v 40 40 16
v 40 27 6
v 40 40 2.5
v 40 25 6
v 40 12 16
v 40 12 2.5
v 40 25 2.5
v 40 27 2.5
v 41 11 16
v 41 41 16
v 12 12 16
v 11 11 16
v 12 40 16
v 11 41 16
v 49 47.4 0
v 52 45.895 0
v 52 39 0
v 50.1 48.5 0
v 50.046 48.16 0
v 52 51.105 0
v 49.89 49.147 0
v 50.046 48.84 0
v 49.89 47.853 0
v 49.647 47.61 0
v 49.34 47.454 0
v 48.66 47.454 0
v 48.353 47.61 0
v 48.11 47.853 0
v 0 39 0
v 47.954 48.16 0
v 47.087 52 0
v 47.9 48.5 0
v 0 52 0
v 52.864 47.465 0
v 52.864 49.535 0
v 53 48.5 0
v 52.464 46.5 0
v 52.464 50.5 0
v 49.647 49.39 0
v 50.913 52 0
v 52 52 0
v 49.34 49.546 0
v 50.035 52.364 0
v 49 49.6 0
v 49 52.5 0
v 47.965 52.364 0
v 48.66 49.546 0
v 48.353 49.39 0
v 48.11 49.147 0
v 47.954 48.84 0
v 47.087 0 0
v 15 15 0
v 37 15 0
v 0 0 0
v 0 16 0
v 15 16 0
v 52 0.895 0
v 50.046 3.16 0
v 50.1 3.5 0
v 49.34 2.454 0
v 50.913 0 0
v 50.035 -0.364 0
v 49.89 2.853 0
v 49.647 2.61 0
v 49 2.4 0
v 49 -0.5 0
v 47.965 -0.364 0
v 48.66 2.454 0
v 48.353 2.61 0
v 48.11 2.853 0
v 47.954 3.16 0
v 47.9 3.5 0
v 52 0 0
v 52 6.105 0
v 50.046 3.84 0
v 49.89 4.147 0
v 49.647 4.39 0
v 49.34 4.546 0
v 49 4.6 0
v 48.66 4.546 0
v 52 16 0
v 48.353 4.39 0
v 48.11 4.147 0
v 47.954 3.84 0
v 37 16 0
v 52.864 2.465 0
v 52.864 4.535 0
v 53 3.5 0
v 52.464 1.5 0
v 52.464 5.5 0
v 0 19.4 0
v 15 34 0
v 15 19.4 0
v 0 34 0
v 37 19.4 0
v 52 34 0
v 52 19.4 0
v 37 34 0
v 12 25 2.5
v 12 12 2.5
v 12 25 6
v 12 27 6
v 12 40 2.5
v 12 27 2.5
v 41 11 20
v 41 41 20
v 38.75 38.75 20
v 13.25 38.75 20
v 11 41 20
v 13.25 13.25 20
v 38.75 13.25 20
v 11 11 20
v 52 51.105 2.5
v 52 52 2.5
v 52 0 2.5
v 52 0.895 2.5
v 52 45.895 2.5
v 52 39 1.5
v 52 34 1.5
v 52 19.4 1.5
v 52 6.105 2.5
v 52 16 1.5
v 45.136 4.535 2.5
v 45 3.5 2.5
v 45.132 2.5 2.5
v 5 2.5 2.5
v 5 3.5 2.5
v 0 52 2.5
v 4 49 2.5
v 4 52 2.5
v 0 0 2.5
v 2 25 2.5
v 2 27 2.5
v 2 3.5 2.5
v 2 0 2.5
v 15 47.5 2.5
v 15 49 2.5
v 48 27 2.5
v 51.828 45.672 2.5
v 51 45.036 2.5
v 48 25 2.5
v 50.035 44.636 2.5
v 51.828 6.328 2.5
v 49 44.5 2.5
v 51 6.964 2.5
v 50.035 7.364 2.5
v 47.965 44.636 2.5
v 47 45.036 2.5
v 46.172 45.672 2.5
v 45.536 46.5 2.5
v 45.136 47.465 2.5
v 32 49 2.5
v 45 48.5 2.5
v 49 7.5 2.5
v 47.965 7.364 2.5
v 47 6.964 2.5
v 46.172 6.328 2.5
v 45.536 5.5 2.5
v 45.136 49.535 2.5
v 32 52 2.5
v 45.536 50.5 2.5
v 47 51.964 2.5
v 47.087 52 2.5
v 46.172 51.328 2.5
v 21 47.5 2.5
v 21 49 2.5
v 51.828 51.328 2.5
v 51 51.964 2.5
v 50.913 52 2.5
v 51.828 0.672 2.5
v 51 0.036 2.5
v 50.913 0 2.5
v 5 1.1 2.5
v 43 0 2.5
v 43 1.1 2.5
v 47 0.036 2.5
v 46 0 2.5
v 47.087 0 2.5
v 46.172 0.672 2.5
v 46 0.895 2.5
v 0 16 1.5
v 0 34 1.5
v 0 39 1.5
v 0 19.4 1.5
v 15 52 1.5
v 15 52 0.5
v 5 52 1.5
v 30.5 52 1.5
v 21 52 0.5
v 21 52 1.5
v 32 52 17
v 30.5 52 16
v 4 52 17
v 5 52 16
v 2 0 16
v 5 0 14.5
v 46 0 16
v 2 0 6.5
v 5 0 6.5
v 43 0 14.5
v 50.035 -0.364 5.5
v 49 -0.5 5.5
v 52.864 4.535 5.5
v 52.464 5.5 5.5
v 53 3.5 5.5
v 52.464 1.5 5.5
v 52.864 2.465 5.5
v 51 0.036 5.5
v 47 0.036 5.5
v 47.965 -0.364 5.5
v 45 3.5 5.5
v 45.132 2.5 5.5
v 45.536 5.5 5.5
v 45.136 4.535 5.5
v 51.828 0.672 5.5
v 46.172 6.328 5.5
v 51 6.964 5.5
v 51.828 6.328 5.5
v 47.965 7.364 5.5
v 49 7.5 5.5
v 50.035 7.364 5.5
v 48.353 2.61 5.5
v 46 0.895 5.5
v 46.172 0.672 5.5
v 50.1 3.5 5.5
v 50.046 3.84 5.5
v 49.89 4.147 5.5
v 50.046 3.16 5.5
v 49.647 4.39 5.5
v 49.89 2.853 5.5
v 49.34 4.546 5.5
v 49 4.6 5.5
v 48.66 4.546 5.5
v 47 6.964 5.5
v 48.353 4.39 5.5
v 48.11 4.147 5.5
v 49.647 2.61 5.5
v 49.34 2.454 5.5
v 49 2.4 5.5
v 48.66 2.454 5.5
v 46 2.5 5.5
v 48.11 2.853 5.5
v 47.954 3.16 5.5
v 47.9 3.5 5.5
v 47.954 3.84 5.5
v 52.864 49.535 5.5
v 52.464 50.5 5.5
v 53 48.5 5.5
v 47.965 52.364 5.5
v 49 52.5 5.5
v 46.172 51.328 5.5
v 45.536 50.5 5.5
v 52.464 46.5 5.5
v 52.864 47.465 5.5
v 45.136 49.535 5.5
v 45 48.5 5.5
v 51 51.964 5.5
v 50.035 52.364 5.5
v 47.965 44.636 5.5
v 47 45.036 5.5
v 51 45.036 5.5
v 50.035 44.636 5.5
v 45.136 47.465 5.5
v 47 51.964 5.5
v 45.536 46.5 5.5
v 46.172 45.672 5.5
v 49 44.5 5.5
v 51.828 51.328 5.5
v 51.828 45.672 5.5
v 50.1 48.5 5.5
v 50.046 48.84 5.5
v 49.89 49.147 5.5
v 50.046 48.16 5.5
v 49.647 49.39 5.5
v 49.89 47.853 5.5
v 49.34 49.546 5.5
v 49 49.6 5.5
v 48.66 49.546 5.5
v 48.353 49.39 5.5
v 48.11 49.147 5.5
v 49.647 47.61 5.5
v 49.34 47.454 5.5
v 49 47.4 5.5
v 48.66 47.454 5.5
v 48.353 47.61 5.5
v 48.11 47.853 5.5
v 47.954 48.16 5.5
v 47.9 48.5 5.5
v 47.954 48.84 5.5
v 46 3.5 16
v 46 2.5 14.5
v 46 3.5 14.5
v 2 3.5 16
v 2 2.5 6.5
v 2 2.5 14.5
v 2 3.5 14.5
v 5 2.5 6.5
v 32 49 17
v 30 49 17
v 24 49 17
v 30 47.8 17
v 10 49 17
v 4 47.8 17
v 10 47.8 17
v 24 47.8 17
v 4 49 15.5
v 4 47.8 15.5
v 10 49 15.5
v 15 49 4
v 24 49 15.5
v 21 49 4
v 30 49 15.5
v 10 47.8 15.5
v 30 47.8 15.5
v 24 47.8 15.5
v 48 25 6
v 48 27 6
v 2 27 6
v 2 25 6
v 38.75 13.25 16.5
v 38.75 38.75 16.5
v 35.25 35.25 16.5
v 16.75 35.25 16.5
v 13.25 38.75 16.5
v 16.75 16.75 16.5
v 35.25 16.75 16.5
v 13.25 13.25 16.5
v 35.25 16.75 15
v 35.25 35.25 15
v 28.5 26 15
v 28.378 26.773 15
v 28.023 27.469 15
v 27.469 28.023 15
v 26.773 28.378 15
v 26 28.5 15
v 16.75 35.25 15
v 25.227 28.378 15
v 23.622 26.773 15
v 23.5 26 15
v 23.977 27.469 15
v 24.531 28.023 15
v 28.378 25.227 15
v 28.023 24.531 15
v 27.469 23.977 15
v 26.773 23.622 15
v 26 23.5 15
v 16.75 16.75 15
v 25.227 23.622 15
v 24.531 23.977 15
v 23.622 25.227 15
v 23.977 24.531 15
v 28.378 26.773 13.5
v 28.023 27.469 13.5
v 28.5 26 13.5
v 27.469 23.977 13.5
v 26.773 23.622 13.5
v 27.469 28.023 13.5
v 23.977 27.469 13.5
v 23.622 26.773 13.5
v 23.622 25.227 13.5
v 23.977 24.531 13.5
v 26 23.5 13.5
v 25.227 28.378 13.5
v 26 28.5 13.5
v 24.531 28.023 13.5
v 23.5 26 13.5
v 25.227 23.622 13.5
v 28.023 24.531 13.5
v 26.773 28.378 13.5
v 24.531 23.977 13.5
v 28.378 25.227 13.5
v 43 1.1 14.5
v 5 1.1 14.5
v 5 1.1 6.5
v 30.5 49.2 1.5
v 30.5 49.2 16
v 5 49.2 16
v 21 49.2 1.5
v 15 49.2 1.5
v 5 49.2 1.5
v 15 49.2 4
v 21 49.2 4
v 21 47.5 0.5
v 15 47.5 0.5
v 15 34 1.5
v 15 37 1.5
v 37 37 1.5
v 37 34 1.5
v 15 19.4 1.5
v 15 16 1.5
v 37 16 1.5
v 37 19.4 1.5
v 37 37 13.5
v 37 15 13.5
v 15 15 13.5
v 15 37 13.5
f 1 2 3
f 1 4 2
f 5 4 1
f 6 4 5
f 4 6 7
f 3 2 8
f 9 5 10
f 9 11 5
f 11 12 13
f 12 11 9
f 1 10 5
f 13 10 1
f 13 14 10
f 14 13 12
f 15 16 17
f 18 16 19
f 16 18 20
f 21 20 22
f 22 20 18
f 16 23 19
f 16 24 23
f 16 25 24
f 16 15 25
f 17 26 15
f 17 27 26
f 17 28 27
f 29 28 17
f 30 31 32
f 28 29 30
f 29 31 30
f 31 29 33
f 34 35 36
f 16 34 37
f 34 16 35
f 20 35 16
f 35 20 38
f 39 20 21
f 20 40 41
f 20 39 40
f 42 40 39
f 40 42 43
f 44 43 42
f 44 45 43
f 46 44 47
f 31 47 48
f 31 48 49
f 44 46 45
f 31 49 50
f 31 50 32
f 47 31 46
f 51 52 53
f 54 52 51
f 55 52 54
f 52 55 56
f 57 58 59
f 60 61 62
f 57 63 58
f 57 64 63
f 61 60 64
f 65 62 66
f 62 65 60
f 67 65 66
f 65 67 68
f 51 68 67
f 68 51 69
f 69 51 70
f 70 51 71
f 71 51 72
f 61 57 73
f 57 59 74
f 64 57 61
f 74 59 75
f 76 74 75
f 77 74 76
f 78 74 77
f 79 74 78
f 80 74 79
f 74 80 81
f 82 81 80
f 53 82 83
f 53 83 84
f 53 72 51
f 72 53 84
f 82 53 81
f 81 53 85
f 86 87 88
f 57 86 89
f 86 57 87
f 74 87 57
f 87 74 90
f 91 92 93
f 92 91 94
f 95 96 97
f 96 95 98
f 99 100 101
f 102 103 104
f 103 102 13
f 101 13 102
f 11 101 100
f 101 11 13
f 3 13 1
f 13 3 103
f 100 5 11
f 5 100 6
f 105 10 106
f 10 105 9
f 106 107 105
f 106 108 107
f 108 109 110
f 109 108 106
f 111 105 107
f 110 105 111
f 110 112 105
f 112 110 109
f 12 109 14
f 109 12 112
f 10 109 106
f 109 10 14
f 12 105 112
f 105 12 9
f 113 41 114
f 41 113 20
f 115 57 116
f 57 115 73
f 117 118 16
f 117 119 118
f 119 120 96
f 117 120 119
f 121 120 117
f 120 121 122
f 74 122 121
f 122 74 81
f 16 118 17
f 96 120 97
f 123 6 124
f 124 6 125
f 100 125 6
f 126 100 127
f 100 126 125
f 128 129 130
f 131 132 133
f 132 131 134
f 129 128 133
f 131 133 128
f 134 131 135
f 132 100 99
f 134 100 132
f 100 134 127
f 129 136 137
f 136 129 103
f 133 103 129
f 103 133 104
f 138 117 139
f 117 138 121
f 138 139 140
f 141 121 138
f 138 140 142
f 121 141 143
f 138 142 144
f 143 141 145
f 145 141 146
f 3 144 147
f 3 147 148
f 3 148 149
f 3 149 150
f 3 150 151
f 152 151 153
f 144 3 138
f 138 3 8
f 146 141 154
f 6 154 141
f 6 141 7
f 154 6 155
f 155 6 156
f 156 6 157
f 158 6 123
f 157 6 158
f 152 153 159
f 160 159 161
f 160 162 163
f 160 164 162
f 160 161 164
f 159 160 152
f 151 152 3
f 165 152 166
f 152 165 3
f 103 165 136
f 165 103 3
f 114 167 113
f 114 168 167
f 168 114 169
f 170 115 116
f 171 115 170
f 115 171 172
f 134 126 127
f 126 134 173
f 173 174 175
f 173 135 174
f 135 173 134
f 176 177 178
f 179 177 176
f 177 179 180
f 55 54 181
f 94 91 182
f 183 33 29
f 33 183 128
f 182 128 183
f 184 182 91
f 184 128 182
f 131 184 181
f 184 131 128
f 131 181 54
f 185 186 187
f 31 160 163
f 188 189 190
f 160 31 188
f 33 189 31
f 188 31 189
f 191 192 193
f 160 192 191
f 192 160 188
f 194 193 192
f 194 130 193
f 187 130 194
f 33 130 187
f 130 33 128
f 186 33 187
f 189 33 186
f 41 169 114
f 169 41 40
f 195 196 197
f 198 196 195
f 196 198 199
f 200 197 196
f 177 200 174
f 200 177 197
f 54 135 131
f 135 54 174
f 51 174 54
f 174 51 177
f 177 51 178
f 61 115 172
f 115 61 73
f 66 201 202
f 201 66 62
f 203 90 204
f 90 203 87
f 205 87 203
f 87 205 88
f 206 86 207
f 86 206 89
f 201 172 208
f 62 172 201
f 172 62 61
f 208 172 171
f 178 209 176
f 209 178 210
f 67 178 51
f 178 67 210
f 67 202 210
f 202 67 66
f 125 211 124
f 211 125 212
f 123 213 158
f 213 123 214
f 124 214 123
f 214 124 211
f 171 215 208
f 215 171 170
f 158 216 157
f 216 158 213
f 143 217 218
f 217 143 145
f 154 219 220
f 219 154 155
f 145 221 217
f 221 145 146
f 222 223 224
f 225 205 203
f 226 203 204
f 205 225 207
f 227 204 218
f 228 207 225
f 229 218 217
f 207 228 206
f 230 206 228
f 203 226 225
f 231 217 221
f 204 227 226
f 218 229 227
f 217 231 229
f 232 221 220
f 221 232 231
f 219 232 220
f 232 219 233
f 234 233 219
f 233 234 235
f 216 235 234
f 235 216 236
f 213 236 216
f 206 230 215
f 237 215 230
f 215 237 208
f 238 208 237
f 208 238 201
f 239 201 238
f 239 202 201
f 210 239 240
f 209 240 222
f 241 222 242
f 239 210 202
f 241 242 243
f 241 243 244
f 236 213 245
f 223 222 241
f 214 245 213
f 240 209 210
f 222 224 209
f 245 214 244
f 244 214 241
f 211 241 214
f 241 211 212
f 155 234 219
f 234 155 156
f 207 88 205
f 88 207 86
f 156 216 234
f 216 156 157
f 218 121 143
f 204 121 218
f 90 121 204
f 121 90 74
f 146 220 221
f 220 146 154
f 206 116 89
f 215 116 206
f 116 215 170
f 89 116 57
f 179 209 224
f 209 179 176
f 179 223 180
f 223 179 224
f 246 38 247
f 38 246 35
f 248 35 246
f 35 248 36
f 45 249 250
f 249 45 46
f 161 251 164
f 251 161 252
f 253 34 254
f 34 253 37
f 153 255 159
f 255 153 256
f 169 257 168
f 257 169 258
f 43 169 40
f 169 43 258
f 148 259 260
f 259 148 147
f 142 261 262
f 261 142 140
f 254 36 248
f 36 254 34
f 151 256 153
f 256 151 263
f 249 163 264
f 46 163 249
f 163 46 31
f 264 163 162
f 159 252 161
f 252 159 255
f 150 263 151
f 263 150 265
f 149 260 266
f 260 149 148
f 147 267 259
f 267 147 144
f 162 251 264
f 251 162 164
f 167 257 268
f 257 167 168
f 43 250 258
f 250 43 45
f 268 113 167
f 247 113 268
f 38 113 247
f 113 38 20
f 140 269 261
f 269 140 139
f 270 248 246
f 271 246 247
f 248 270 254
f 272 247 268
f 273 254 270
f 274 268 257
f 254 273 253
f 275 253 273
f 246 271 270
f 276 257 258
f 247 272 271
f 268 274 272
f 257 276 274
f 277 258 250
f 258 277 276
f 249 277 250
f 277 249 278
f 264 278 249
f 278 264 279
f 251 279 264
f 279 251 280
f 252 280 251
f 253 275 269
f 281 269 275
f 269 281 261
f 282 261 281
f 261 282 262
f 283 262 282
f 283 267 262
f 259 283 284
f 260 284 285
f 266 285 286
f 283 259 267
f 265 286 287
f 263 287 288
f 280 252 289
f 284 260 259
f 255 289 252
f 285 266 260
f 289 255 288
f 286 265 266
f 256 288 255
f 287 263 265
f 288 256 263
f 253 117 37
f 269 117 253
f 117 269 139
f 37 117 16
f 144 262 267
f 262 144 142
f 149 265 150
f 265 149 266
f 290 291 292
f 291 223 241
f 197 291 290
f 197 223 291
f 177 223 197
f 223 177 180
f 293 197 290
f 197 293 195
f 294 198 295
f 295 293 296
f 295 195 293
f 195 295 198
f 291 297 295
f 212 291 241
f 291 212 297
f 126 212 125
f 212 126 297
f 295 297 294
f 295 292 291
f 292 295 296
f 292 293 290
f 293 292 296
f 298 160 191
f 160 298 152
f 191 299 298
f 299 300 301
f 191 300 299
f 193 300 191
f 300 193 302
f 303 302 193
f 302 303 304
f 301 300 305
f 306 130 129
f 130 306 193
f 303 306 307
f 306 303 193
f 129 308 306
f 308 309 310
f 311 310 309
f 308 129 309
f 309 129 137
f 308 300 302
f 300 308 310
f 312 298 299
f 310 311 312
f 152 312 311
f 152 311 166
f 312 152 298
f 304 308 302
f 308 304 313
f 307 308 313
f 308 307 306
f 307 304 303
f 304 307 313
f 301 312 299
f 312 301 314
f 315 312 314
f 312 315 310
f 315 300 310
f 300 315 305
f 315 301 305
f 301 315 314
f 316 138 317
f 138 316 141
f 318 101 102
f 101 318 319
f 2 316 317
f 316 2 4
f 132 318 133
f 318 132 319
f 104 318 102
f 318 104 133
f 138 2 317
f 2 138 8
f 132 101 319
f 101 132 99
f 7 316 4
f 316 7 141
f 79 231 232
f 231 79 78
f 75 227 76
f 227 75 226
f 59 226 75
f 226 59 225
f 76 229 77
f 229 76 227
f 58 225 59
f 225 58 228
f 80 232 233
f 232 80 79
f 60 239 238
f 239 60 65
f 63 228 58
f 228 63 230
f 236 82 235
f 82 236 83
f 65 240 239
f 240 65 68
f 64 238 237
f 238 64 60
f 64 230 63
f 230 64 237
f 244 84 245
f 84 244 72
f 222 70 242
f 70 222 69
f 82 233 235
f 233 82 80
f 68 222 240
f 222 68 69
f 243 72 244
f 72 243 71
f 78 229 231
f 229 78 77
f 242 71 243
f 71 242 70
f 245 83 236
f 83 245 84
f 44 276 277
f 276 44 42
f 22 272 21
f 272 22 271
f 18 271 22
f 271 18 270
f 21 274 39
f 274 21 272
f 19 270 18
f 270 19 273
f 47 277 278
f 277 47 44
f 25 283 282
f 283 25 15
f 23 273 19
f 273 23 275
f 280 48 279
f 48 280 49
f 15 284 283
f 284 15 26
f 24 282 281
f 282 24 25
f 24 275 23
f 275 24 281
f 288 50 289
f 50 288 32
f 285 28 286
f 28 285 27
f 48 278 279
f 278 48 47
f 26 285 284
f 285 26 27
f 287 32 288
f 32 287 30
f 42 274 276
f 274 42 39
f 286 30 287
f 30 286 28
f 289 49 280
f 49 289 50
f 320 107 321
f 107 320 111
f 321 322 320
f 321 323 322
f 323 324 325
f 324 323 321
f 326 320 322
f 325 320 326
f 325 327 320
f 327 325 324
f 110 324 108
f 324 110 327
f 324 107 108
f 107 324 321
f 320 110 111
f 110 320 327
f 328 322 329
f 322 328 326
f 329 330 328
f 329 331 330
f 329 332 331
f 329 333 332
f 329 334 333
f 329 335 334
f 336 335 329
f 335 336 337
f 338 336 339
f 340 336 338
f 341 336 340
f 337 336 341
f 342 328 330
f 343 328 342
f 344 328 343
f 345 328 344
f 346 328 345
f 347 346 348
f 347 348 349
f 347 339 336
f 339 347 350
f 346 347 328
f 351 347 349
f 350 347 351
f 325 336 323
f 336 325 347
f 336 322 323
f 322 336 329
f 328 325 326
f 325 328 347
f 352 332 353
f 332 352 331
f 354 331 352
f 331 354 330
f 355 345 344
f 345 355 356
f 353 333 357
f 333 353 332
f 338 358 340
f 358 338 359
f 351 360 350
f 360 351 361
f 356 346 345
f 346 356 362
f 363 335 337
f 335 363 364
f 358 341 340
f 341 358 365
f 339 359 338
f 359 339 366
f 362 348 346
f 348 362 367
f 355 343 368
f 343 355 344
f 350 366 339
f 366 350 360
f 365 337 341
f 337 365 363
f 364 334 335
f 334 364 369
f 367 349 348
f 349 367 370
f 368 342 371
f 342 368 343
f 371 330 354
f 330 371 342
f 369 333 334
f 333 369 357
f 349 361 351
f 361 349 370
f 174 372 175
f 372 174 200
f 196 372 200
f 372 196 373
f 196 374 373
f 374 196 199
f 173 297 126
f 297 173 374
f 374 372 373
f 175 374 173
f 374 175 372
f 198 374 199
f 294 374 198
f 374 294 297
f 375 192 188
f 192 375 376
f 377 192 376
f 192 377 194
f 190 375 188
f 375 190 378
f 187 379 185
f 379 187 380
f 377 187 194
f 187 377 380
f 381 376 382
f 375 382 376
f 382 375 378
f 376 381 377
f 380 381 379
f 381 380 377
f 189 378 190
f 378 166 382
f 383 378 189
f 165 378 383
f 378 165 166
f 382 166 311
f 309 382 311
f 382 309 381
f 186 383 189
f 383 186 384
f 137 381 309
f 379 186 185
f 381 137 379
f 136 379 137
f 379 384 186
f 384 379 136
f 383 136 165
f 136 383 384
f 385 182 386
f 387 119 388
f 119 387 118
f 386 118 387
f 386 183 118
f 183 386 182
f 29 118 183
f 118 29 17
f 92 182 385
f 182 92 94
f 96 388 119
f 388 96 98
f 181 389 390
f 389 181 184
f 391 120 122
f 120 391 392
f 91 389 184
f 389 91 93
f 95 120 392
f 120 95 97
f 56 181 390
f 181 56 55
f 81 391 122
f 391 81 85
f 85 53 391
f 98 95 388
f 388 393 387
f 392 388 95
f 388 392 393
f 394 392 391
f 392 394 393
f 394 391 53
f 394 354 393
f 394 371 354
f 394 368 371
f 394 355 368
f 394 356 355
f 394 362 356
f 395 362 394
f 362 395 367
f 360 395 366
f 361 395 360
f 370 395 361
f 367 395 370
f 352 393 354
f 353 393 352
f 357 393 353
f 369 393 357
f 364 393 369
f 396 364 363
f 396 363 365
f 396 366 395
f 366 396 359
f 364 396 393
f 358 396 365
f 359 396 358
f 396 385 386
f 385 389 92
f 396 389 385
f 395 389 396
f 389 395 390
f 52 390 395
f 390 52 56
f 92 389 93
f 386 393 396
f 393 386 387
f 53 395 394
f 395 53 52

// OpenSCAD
// file: ../../00_common/screw_bosses.scad
// =============================================================================
// OpenMotorBridge - Screw Bosses & Fastener Primitives
// =============================================================================
// File: hardware/cad/scad/00_common/screw_bosses.scad
// Description: Reusable parametric modules for screw standoffs, corner clamping
//              posts, and mounting ears.
// =============================================================================

include <parameters.scad>;

// 1. Cylindrical Screw Standoff Boss (with center hole)
module screw_boss(outer_r=2.5, inner_r=1.2, h=5.0) {
    difference() {
        cylinder(r=outer_r, h=h, center=false);
        translate([0, 0, -0.1])
            cylinder(r=inner_r, h=h + 0.2, center=false);
    }
}

// 2. Rectangular Corner Clamping Post (with center screw hole)
module corner_screw_post(size_x=5.0, size_y=5.0, h=12.0, hole_r=1.65, hole_h=10.0, hole_offset_z=2.0) {
    difference() {
        cube(size=[size_x, size_y, h], center=false);
        translate([size_x/2.0, size_y/2.0, hole_offset_z])
            cylinder(r=hole_r, h=hole_h + 0.1, center=false);
    }
}

// 3. M4 Silentblock Outer Mounting Ear (Centered in Y around y=0, extends along +X)
module mounting_ear_m4(ear_len=14.0, ear_w=12.0, ear_h=5.0, hole_r=2.2) {
    difference() {
        union() {
            translate([0, -ear_w/2.0, 0])
                cube(size=[ear_len - ear_w/2.0, ear_w, ear_h], center=false);
            translate([ear_len - ear_w/2.0, 0, 0])
                cylinder(r=ear_w/2.0, h=ear_h, center=false);
        }
        translate([ear_len - ear_w/2.0, 0, -0.1])
            cylinder(r=hole_r, h=ear_h + 0.2, center=false);
    }
}

// 4. Captive Hex Nut Pocket (DIN 934 / DIN 985 with center screw through-hole)
module hex_nut_pocket(sw=NUT_M4_SW, h=NUT_M4_H, screw_r=M4_SCREW_HOLE_R, through_h=10.0) {
    // Hexagonal pocket (flat-to-flat SW converted to circle radius: r = sw / sqrt(3))
    hex_r = sw / sqrt(3);
    union() {
        // Hexagonal nut pocket
        cylinder(r=hex_r, h=h, center=false, $fn=6);
        // Screw clearance through-hole
        translate([0, 0, -through_h/2.0])
            cylinder(r=screw_r, h=through_h + h, center=false, $fn=30);
    }
}
// file: ../../00_common/parameters.scad
// =============================================================================
// OpenMotorBridge - Global CAD Parameters & Settings
// =============================================================================
// File: hardware/cad/scad/00_common/parameters.scad
// Description: Global dimensional constants, manufacturing clearances and
//              circle resolution ($fn) for all OpenSCAD modules.
// =============================================================================

// --- 1. Circle & Curve Resolution ---
$fn = 60; // Smooth cylinders and holes for high-quality MJF 3D printing

// --- 2. Central Main Box Dimensions (3-Tier Sandwich) ---
MAIN_BOX_OUTER_L      = 110.0; // Outer length in X (mm)
MAIN_BOX_OUTER_W      = 74.0;  // Outer width in Y (mm)
MAIN_BOX_LOWER_H      = 17.0;  // Lower case height in Z (mm)
MAIN_BOX_MID_H        = 15.0;  // Mid tray height in Z (mm)
MAIN_BOX_LID_H        = 4.0;   // Lid plate thickness in Z (mm)
MAIN_BOX_WALL         = 2.5;   // Nominal wall thickness (mm)
MAIN_BOX_CORNER_POST  = 7.0;   // Corner clamping screw post size (mm, for M3 hex nut pockets)

// --- 3. Satellite Pod Dimensions (Universal Enlarged Envelope) ---
POD_OUTER_L           = 135.0; // Outer length in X (mm)
POD_OUTER_W           = 70.0;  // Outer width in Y (mm)
POD_OUTER_H           = 38.0;  // Outer height in Z (mm)
POD_WALL              = 3.5;   // Nominal wall thickness (mm)
POD_BULKHEAD_X        = 18.0;  // Partition bulkhead position in X (mm)
POD_CHAMBER_L         = 117.0; // Sliding chamber length in X (mm)
POD_CHAMBER_W         = 63.0;  // Sliding chamber width in Y (mm)
POD_CHAMBER_H         = 31.0;  // Sliding chamber height in Z (mm)

// --- 4. Pod Linear Guide Rails (Poka-Yoke Tongue & Groove) ---
POD_GROOVE_W          = 3.0;   // Internal guide groove width in Z (mm)
POD_GROOVE_DEPTH      = 1.5;   // Internal guide groove depth in Y (mm)
POD_GROOVE_LEFT_Z     = 10.0;  // Center height of left groove (mm)
POD_GROOVE_RIGHT_Z    = 18.0;  // Center height of right groove (mm, asym offset)

CARTRIDGE_TONGUE_W    = 2.6;   // Cartridge tongue rail height in Z (mm, 0.2mm clearance)
CARTRIDGE_TONGUE_PROT = 1.4;   // Cartridge tongue protrusion in Y (mm, 0.1mm clearance)
CARTRIDGE_CHAMFER_L   = 4.0;   // 30° lead-in chamfer nose length (mm)

// --- 5. Cartridge Dimensions (Enlarged Universal Sled) ---
CARTRIDGE_BASE_L      = 116.0; // Sled length in X (mm)
CARTRIDGE_BASE_W      = 58.0;  // Sled width in Y (mm)
CARTRIDGE_BASE_H      = 28.0;  // Sled height in Z (mm)
CARTRIDGE_FACE_L      = 4.0;   // Front faceplate thickness in X (mm)
CARTRIDGE_FACE_W      = 64.0;  // Front faceplate width in Y (mm)
CARTRIDGE_FACE_H      = 34.0;  // Front faceplate height in Z (mm)

// --- 5a. RF Interface & Sealing Dimensions ---
SMA_BORE_R            = 3.25;  // Ø 6.5 mm through-hole for standard SMA bulkhead
SMA_ORECESS_R         = 4.75;  // Ø 9.5 mm recess for waterproof silicone O-ring
SMA_ORECESS_DEPTH     = 1.2;   // 1.2 mm deep O-ring compression pocket

// --- 5b. Magnetic Anti-Theft Lock System ---
LATCH_PIVOT_X         = 58.0;  // Center pivot position along sled X (mm)
LATCH_MAGNET_X        = 46.0;  // Ferromagnetic anchor position along sled X (mm)
LATCH_TOOTH_X         = 70.0;  // Locking sawtooth pawl position along sled X (mm)
LATCH_ARM_H           = 6.0;   // Rocker lever height in Z (mm)
LATCH_ARM_THICK       = 2.6;   // Rocker beam thickness in Y (mm)
LATCH_MAGNET_PIN_DIA  = 6.2;   // Bore for Ø 6.0 mm steel dowel pin (mm)
LATCH_SPRING_DIA      = 3.8;   // Bore for Ø 3.5 mm return compression spring (mm)

// --- 6. Standard Captive Hex Nut Pockets (DIN 934 / DIN 985 with +0.2 mm MJF/FDM clearance) ---
NUT_M2_SW             = 4.2;   // M2 across flats (nominal 4.0 mm)
NUT_M2_H              = 1.8;   // M2 thickness (nominal 1.6 mm)
NUT_M2_5_SW           = 5.2;   // M2.5 across flats (nominal 5.0 mm)
NUT_M2_5_H            = 2.2;   // M2.5 thickness (nominal 2.0 mm)
NUT_M3_SW             = 5.7;   // M3 across flats (nominal 5.5 mm)
NUT_M3_H              = 2.6;   // M3 thickness (nominal 2.4 mm)
NUT_M4_SW             = 7.2;   // M4 across flats (nominal 7.0 mm)
NUT_M4_H              = 3.4;   // M4 thickness (nominal 3.2 mm)
NUT_M5_SW             = 8.2;   // M5 across flats (nominal 8.0 mm)
NUT_M5_H              = 4.2;   // M5 thickness (nominal 4.0 mm)

// Direct Plastic Thread-Forming / Self-Tapping Pilot Holes in PA12 (100% Soldering-Iron Free)
M2_PILOT_HOLE_R       = 0.85;  // Core hole for M2 screws in PA12 (Ø 1.7 mm)
M2_5_PILOT_HOLE_R     = 1.05;  // Core hole for M2.5 screws in PA12 (Ø 2.1 mm)
M3_PILOT_HOLE_R       = 1.25;  // Core hole for M3 screws in PA12 (Ø 2.5 mm)

// --- 7. Screw & Clearance Dimensions ---
M2_SCREW_HOLE_R       = 1.1;   // M2 clearance hole (r = 1.1 mm -> Ø 2.2 mm)
M2_5_SCREW_HOLE_R     = 1.4;   // M2.5 clearance hole (r = 1.4 mm -> Ø 2.8 mm)
M3_SCREW_HOLE_R       = 1.65;  // M3 clearance hole (r = 1.65 mm -> Ø 3.3 mm)
M4_SCREW_HOLE_R       = 2.2;   // M4 clearance hole (r = 2.2 mm -> Ø 4.4 mm)
M8_BORE_R             = 4.0;   // M8 cable through-bore (r = 4.0 mm -> Ø 8.0 mm)
M8_STUDS_OUTER_R      = 6.0;   // M8 neck outer radius (Ø 12.0 mm)

// --- 8. Universal Front Node Enclosure Dimensions (Type E: 98 x 68 x 25 mm) ---
FRONT_NODE_PCB_L      = 82.0;  // PCB length in X (mm, PCBA 05)
FRONT_NODE_PCB_W      = 50.0;  // PCB width in Y (mm, PCBA 05)
FRONT_NODE_PCB_H      = 1.6;   // PCB thickness in Z (mm)
FRONT_NODE_PCB_R      = 2.5;   // PCB corner radius (mm)

FRONT_NODE_CHAMBER_L  = 86.0;  // Internal chamber length in X (mm, 2mm margin per side)
FRONT_NODE_CHAMBER_W  = 56.0;  // Internal chamber width in Y (mm, 3mm margin per side)
FRONT_NODE_TUB_H      = 17.5;  // Lower tub depth in Z (mm)
FRONT_NODE_LID_H      = 7.5;   // Upper lid height in Z (mm)
FRONT_NODE_WALL       = 2.5;   // Wall thickness in HP MJF PA12 (mm)
FRONT_NODE_CORNER_R   = 4.0;   // Outer enclosure corner radius (mm)

FRONT_NODE_OUTER_L    = FRONT_NODE_CHAMBER_L + 2 * FRONT_NODE_WALL + 7.0; // 98.0 mm
FRONT_NODE_OUTER_W    = FRONT_NODE_CHAMBER_W + 2 * FRONT_NODE_WALL + 7.0; // 68.0 mm
FRONT_NODE_OUTER_H    = FRONT_NODE_TUB_H + FRONT_NODE_LID_H;              // 25.0 mm

// PCB Standoff Heights & Radii (100% Soldering-Iron Free)
FRONT_NODE_STANDOFF_H = 3.0;   // Height of PCB standoffs from floor (mm)
FRONT_NODE_STANDOFF_R = 3.0;   // Outer radius of M2.5 screw bosses (mm)
FRONT_NODE_CORE_HOLE_R= M2_5_PILOT_HOLE_R; // Core hole for direct M2.5 screw engagement (Ø 2.1 mm)

// AMPS 4-Hole Mounting Pattern (38 x 30 mm with DIN 934 M4 Captive Nut Pockets)
AMPS_SPACING_X        = 38.0;  // AMPS hole distance in X (mm)
AMPS_SPACING_Y        = 30.0;  // AMPS hole distance in Y (mm)
AMPS_NUT_SW           = NUT_M4_SW; // Captive M4 hex nut pocket across flats (7.2 mm)
AMPS_NUT_H            = NUT_M4_H;  // Captive M4 hex nut pocket depth (3.4 mm)

// Acoustic Vent for Knowles SPH0645 MEMS
FRONT_NODE_MIC_HOLE_R = 1.25;  // Sound canal radius (Ø 2.5 mm)
FRONT_NODE_MIC_MEMB_R = 3.0;   // Gore ePTFE membrane pocket radius (Ø 6.0 mm)
FRONT_NODE_MIC_MEMB_D = 0.8;   // Membrane pocket depth (mm)
// main file
// =============================================================================
// OpenMotorBridge - Satellite Pod: OMM Transceiver Antenna Bracket
// =============================================================================
// File: hardware/cad/scad/03_pod_cartridges/parts/04_antenna_bracket_omm.scad
// Description: Parametric modular antenna carrier bracket for Pod 3.
//              Mounts in the rear chamber of the universal cartridge base sled
//              (X = 58.0 .. 112.0 mm) via the two rear corner posts.
//              Features:
//              1. Elevated top cradle for 18x18mm / 25x25mm GNSS patch antenna
//              2. Lateral vertical bed for 868 MHz LoRa FPC dipole antenna
//              3. Cable channels & strain relief for U.FL micro-coax leads
// =============================================================================

include <../../00_common/parameters.scad>;
include <../../00_common/screw_bosses.scad>;

module omm_antenna_bracket(
    bracket_l = 52.0,  // Length in X (X = 58.0 .. 110.0 mm in sled frame)
    bracket_w = 52.0,  // Width in Y (fits inside 53 mm sled bay)
    bracket_h = 20.0,  // Height in Z (reaches up to top lid)
    wall      = 2.0
) {
    difference() {
        union() {
            // 1. Base Plate & Floor Stiffeners (Z = 0 .. 2.5 mm)
            cube([bracket_l, bracket_w, 2.5], center=false);

            // 2. Dual Rear Fastening Ears (aligning with sled rear corner posts at X=51.0, Y=3.5 & Y=48.5)
            // Standoff ears with 2.8mm outer radius, h = 5.5 mm
            translate([bracket_l - 3.0, 3.5, 0])
                cylinder(r=4.0, h=5.5, center=false, $fn=24);
            translate([bracket_l - 3.0, bracket_w - 3.5, 0])
                cylinder(r=4.0, h=5.5, center=false, $fn=24);

            // 3. Elevated GNSS Ceramic Patch Antenna Tower & Cradle (Z = 2.5 .. bracket_h)
            // Centered in Y, positioned at X = 12.0 .. 42.0 mm
            translate([12.0, (bracket_w - 28.0)/2.0, 0]) {
                // Support A-frame columns
                cube([28.0, 28.0, bracket_h - 4.0], center=false);
                // Top cradle perimeter flange (Z = bracket_h - 4.0 .. bracket_h)
                translate([-1.0, -1.0, bracket_h - 4.0])
                    cube([30.0, 30.0, 4.0], center=false);
            }

            // 4. Lateral LoRa 868 MHz FPC Antenna Bed (Left vertical wall along Y = 0 .. 2.5 mm)
            translate([2.0, 0, 0])
                cube([bracket_l - 8.0, 2.5, 16.0], center=false);

            // Top retaining lip for LoRa FPC antenna
            translate([2.0, 0, 14.5])
                cube([bracket_l - 8.0, 3.5, 1.5], center=false);

            // 4b. Lateral 5.9 GHz V2X Ceramic Patch Antenna Snap Bed (Right vertical wall along Y = bracket_w - 3.5 .. bracket_w)
            translate([4.0, bracket_w - 3.0, 0])
                cube([28.0, 3.0, 17.0], center=false);

            // Dual Snap Retention Tabs for 25x25mm V2X ceramic patch
            translate([4.0, bracket_w - 4.2, 15.5])
                cube([6.0, 1.4, 1.5], center=false);
            translate([24.0, bracket_w - 4.2, 15.5])
                cube([6.0, 1.4, 1.5], center=false);

            // 5. Center-to-Side Structural Ribs (Kreuzverrippung)
            translate([2.0, bracket_w/2.0 - 1.0, 0])
                cube([bracket_l - 6.0, 2.0, 6.0], center=false);
        }

        // --- SUBTRACTIONS (Clearances, pockets, bores) ---

        // A. 2x M2 Fastening Holes (Countersunk for M2 screws into rear sled posts)
        translate([bracket_l - 3.0, 3.5, -0.5])
            cylinder(r=M2_SCREW_HOLE_R, h=7.0, center=false, $fn=20);
        translate([bracket_l - 3.0, bracket_w - 3.5, -0.5])
            cylinder(r=M2_SCREW_HOLE_R, h=7.0, center=false, $fn=20);

        // B. GNSS Ceramic Patch Antenna Pocket (25.5 x 25.5 x 3.5 mm deep at top face)
        translate([13.25, (bracket_w - 25.5)/2.0, bracket_h - 3.5])
            cube([25.5, 25.5, 4.0], center=false);

        // Nested 18.5 x 18.5 mm center pocket for compact patch antennas
        translate([16.75, (bracket_w - 18.5)/2.0, bracket_h - 5.0])
            cube([18.5, 18.5, 2.0], center=false);

        // Center through-hole for GNSS coaxial cable / pin feed (Ø 5.0 mm)
        translate([26.0, bracket_w/2.0, 0])
            cylinder(r=2.5, h=bracket_h + 1.0, center=false, $fn=20);

        // C. Lateral LoRa FPC Antenna Recessed Adhesive Channel (40 x 12 x 1.0 mm)
        translate([5.0, -0.1, 2.5])
            cube([bracket_l - 14.0, 1.2, 12.0], center=false);

        // LoRa Coax Exit Notch (at X = 4.0 mm)
        translate([2.0, -0.5, 2.5])
            cube([3.0, 4.0, 4.0], center=false);

        // C2. 5.9 GHz V2X Ceramic Patch Pocket & Cable Feed Slot (25.5 x 4.2 mm, Right wall)
        translate([5.0, bracket_w - 2.8, 1.5])
            cube([25.5, 3.0, 14.5], center=false);
        translate([15.0, bracket_w - 4.5, 0.5])
            cube([6.0, 4.5, 3.5], center=false); // V2X micro-coax exit slot

        // D. Longitudinal Cable Channel (runs through floor for 2.4G coax to front/rear SMA)
        translate([-0.5, bracket_w/2.0 + 8.0, -0.5])
            cube([bracket_l + 2.0, 5.0, 2.0], center=false);

        // D2. External SHT40 Temperature Sensor Wire Channel & Strain Relief Groove (Floor Ø 3.2 mm)
        translate([-0.5, bracket_w/2.0 - 10.0, -0.5])
            cube([bracket_l + 2.0, 3.4, 2.0], center=false);

        // E. Weight Reduction Hollow Under GNSS Tower
        translate([15.0, (bracket_w - 22.0)/2.0, -0.5])
            cube([22.0, 22.0, bracket_h - 6.0], center=false);
    }
}

// Standalone printable preview
omm_antenna_bracket();
